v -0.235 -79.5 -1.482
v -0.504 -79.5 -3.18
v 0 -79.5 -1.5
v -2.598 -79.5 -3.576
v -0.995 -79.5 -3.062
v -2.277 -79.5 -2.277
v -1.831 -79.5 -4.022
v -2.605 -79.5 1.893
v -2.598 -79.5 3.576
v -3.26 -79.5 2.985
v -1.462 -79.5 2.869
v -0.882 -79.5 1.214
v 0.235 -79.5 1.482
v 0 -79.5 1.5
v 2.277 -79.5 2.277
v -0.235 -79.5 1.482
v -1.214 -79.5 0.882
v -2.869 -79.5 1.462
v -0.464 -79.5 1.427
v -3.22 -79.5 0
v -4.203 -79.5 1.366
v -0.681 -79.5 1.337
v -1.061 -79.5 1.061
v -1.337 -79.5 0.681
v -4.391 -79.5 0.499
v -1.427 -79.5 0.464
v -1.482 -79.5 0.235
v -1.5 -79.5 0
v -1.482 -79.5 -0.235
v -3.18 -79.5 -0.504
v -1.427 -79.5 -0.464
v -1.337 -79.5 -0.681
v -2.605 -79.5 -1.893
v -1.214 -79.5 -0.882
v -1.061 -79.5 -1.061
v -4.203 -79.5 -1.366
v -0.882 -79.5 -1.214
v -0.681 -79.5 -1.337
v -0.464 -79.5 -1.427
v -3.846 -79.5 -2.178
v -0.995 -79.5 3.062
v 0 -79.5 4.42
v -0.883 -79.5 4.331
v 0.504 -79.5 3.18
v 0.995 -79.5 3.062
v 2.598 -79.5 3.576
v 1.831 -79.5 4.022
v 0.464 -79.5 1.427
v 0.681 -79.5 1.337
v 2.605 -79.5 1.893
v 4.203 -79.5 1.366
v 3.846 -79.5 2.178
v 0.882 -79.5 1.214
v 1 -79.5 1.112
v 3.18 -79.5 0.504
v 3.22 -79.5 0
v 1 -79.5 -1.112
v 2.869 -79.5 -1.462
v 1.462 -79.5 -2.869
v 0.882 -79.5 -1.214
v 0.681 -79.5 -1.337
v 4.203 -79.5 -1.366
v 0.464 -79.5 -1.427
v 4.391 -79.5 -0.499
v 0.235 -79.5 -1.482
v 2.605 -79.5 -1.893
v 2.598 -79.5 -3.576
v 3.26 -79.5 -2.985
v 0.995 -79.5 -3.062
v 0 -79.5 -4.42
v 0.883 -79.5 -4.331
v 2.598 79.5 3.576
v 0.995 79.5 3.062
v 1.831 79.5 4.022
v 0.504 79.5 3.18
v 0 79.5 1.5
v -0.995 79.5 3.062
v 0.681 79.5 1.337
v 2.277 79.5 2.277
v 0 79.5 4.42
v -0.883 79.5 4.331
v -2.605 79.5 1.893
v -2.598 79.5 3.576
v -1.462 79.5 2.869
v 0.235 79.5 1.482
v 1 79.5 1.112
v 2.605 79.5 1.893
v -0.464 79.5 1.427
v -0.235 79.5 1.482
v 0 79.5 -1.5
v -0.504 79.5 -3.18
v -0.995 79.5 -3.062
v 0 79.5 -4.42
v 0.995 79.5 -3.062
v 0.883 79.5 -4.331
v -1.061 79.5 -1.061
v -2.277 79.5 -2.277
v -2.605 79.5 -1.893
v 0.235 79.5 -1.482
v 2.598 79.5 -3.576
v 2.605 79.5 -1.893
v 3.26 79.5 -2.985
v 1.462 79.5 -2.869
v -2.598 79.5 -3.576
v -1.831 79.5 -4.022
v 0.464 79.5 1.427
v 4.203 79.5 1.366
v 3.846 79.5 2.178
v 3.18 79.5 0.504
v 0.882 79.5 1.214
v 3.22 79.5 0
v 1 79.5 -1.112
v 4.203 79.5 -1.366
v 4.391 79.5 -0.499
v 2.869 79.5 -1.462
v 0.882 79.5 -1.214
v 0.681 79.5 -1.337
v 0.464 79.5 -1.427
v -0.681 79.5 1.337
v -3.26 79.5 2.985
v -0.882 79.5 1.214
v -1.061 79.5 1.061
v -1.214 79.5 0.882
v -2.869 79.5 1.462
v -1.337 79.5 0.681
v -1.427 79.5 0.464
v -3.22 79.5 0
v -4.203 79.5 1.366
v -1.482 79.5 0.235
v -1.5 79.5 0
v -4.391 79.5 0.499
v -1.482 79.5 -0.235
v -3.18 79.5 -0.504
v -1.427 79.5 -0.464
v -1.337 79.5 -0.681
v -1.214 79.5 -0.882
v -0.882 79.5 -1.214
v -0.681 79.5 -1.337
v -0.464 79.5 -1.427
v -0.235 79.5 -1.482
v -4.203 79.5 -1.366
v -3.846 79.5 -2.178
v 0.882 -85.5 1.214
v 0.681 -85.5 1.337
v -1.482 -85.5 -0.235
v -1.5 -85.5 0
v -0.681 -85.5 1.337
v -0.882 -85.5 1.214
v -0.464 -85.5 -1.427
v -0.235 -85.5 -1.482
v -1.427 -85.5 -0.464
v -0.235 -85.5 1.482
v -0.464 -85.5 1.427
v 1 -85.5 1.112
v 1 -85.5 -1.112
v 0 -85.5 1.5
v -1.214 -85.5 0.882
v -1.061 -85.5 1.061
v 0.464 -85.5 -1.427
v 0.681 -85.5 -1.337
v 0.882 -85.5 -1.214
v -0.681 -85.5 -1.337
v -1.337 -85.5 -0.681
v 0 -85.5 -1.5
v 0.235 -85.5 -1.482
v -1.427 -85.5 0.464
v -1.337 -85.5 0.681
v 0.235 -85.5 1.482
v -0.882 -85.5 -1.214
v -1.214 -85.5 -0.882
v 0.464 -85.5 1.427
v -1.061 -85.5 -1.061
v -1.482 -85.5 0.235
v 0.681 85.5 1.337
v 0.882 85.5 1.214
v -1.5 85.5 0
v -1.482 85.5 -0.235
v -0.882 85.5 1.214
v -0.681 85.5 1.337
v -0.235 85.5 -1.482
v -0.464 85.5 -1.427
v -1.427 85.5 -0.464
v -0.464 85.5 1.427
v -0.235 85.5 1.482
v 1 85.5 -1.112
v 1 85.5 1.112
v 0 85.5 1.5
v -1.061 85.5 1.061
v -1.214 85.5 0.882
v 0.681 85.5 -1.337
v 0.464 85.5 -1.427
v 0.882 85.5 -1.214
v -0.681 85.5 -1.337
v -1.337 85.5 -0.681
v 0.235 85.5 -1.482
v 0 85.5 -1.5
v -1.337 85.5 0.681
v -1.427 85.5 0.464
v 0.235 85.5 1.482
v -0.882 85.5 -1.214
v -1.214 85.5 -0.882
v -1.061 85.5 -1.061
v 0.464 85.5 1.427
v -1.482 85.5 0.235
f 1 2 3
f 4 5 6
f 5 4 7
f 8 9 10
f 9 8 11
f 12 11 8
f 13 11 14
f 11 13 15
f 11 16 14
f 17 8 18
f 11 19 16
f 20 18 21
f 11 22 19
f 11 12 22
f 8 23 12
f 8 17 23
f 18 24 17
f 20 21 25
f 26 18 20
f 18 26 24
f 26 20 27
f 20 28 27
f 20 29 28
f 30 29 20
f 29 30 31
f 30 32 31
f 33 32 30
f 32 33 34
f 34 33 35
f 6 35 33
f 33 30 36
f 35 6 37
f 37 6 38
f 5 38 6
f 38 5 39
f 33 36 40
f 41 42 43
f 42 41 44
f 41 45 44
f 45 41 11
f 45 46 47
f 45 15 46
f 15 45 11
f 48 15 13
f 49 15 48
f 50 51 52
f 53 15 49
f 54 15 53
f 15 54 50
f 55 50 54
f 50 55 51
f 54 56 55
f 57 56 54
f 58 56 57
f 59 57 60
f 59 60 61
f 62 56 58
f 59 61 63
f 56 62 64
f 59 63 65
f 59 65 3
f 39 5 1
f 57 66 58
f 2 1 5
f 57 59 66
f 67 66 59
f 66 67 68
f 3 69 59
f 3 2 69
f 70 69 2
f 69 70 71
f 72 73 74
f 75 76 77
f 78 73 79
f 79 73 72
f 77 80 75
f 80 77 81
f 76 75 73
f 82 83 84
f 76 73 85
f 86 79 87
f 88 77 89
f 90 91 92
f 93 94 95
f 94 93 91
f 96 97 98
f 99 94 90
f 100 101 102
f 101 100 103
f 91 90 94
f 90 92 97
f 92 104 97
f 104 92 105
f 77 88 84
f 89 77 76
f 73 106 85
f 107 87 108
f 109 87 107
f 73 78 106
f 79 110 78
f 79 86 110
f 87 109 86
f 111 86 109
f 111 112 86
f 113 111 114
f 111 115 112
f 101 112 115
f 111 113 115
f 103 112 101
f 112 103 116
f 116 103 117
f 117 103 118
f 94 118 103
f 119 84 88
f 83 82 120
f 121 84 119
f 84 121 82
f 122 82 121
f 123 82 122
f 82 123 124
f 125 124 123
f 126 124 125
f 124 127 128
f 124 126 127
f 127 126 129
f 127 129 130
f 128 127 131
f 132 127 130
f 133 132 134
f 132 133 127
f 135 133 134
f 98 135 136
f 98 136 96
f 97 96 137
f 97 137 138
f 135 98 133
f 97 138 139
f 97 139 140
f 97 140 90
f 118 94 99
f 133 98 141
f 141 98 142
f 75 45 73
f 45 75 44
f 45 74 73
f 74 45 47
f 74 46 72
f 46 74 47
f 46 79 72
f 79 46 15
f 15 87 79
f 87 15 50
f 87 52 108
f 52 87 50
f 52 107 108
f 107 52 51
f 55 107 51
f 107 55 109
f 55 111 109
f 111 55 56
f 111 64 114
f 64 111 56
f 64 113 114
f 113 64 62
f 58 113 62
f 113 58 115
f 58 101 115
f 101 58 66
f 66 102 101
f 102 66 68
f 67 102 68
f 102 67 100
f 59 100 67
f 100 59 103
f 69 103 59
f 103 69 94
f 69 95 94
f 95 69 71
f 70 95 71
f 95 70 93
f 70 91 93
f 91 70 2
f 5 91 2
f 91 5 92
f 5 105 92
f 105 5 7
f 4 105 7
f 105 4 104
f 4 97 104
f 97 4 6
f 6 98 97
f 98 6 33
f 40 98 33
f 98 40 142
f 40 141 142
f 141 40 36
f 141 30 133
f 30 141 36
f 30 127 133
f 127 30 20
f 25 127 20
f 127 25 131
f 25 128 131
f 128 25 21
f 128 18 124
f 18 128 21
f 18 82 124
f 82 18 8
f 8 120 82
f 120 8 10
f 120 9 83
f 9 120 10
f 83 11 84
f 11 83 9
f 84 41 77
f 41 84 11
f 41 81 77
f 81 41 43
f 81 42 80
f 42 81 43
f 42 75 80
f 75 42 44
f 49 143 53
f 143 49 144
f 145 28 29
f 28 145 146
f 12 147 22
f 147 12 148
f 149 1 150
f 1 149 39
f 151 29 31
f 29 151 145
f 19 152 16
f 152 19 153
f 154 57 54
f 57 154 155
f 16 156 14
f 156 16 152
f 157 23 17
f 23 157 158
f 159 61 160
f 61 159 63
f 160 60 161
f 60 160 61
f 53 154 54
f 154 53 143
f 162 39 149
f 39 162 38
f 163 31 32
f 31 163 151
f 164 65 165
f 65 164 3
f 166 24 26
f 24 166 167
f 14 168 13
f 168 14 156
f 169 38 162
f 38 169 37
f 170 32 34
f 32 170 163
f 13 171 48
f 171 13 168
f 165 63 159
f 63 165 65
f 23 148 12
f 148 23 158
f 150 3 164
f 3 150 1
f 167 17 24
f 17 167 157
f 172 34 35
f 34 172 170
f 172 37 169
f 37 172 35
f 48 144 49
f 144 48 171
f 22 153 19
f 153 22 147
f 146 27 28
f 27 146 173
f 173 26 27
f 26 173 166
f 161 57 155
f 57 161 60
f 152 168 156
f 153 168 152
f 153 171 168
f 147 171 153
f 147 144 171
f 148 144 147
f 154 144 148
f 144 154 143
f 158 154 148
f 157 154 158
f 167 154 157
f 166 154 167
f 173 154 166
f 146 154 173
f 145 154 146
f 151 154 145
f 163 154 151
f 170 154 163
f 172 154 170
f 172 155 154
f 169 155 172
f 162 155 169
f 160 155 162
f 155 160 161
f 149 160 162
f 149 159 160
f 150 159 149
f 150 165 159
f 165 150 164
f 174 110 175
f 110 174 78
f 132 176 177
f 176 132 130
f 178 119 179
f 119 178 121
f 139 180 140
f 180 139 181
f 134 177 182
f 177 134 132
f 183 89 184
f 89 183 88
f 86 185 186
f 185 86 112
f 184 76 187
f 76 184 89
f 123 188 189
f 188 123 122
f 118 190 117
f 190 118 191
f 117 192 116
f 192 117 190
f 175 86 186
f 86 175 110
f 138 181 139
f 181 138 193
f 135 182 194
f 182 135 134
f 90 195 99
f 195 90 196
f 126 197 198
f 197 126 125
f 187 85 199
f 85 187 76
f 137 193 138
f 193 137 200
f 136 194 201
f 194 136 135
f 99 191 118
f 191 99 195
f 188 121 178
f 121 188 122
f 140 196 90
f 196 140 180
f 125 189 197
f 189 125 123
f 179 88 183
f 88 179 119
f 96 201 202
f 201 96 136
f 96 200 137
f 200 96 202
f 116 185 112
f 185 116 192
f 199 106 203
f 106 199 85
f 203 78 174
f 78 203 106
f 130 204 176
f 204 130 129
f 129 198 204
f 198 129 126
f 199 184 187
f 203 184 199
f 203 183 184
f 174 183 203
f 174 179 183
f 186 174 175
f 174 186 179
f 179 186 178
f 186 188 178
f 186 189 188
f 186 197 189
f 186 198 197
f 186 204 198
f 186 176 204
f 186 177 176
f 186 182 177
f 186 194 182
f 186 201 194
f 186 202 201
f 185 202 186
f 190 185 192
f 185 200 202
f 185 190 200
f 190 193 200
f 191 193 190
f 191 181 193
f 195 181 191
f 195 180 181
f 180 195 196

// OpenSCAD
// file: parts/ch1_03c_long_gear_shaft_params.scad
// CH1 03C 长齿轮轴 — 参数真值源
// 单位：毫米。坐标约定：轴线沿世界 Y；齿轮截面位于 XZ 平面。

//#region 导入/依赖
// 无外部依赖；数值与现有 cabinet_clutch.scad 的 3 mm 节距齿轮保持一致。
//#endregion

//#region 常量/配置
LONG_GEAR_MODEL = is_undef(LONG_GEAR_MODEL) ? "solid" : LONG_GEAR_MODEL;
// x1c_fine = 0.4 mm 喷嘴下的细杆主方案；standard = 原 12T/3 mm 兼容回退。
LONG_GEAR_PRESET = is_undef(LONG_GEAR_PRESET) ? "x1c_fine" : LONG_GEAR_PRESET;

LONG_GEAR_TEETH = is_undef(LONG_GEAR_TEETH)
    ? (LONG_GEAR_PRESET == "x1c_fine" ? 10 : 12)
    : LONG_GEAR_TEETH;
LONG_GEAR_PITCH_MM = is_undef(LONG_GEAR_PITCH_MM)
    ? (LONG_GEAR_PRESET == "x1c_fine" ? 2.4 : 3.0)
    : LONG_GEAR_PITCH_MM;
LONG_GEAR_TOOTH_DEPTH = is_undef(LONG_GEAR_TOOTH_DEPTH)
    ? (LONG_GEAR_PRESET == "x1c_fine" ? 0.60 : 0.82)
    : LONG_GEAR_TOOTH_DEPTH;

// 细版略放宽齿根槽，使 0.4 mm 喷嘴仍有可辨识的开口；standard 保持
// 原仓库 0.20→0.80 的齿顶/齿根分配。
LONG_GEAR_TIP_START = is_undef(LONG_GEAR_TIP_START)
    ? (LONG_GEAR_PRESET == "x1c_fine" ? 0.18 : 0.20)
    : LONG_GEAR_TIP_START;
LONG_GEAR_TIP_END = is_undef(LONG_GEAR_TIP_END)
    ? 0.50
    : LONG_GEAR_TIP_END;
LONG_GEAR_ROOT_END = is_undef(LONG_GEAR_ROOT_END)
    ? (LONG_GEAR_PRESET == "x1c_fine" ? 0.75 : 0.80)
    : LONG_GEAR_ROOT_END;

// 当前 cabinet_clutch 的上下同步轮中心间距约 158.93 mm；取 159 mm，
// 让齿段覆盖几乎整个动力杆，同时保留两端装同步轮的 D 轴伸出段。
LONG_GEAR_LENGTH = is_undef(LONG_GEAR_LENGTH) ? 159.0 : LONG_GEAR_LENGTH;
LONG_GEAR_END_STUB_LENGTH = is_undef(LONG_GEAR_END_STUB_LENGTH)
    ? 6.0
    : LONG_GEAR_END_STUB_LENGTH;       // 齿段两端各外露 6 mm
LONG_GEAR_STUB_OVERLAP = is_undef(LONG_GEAR_STUB_OVERLAP)
    ? 0.20
    : LONG_GEAR_STUB_OVERLAP;           // 实心版端轴向齿段内搭接

LONG_GEAR_END_D = 3.0;                // 两端同步轮安装轴：名义 Ø3 mm
LONG_GEAR_END_FLAT_DEPTH = 0.50;      // D 平面从圆周切入 0.50 mm

// sleeve 版套在现有金属 Ø3 mm D 轴上；按仓库现有打印配合写法给径向余量。
LONG_GEAR_BORE_RADIAL_CLEARANCE = 0.12;
LONG_GEAR_BORE_FLAT_CLEARANCE = 0.12;

LONG_GEAR_EPS = 0.05;
//#endregion

//#region 模型/类型
// solid  = 实心齿轮轴 + 两端整体 D 轴；
// sleeve = 长齿轮本体带 D 孔，套在外部金属 D 轴上。
//#endregion

//#region 私有成员：齿形函数
function long_gear_pitch_r() =
    LONG_GEAR_TEETH * LONG_GEAR_PITCH_MM / (2 * PI);

function long_gear_root_r() =
    long_gear_pitch_r() - LONG_GEAR_TOOTH_DEPTH;

function long_gear_tip_r() =
    long_gear_pitch_r() + LONG_GEAR_TOOTH_DEPTH;

function long_gear_outer_d() =
    2 * long_gear_tip_r();

function long_gear_tip_land_mm() =
    (LONG_GEAR_TIP_END - LONG_GEAR_TIP_START)
        * LONG_GEAR_PITCH_MM
        * long_gear_tip_r() / long_gear_pitch_r();

function long_gear_root_gap_mm() =
    (1.0 - LONG_GEAR_ROOT_END)
        * LONG_GEAR_PITCH_MM
        * long_gear_root_r() / long_gear_pitch_r();

function long_gear_polar(r, a) = [r * cos(a), r * sin(a)];

// 每个齿沿 Y 方向是连续直齿；XZ 截面采用参数化的齿顶平台轮廓。
// standard 复用旧的 0.20→0.80 分配，x1c_fine 则把齿顶起点前移、齿根槽放宽。
function long_gear_points() = [
    for (i = [0:LONG_GEAR_TEETH - 1])
        for (p = [
            [0.00, long_gear_root_r()],
            [LONG_GEAR_TIP_START, long_gear_tip_r()],
            [LONG_GEAR_TIP_END, long_gear_tip_r()],
            [LONG_GEAR_ROOT_END, long_gear_root_r()]
        ])
            let (a = (i + p[0]) * 360 / LONG_GEAR_TEETH)
                long_gear_polar(p[1], a)
];
//#endregion

//#region 公开 API
// 根入口由 ch1_03c_long_gear_shaft.scad 消费；参数文件本身不输出几何。
//#endregion

//#region 业务逻辑
// 该组件的默认工作方向是：Y 轴为长度方向，XZ 平面为齿轮截面。
//#endregion

//#region 方法/工具
assert(LONG_GEAR_PRESET == "x1c_fine" || LONG_GEAR_PRESET == "standard",
    "unknown long gear preset");
assert(LONG_GEAR_TEETH >= 6, "long gear needs at least 6 teeth");
assert(LONG_GEAR_PITCH_MM > 0, "gear pitch must be positive");
assert(long_gear_root_r() > 0, "gear root radius must be positive");
assert(
    0 < LONG_GEAR_TIP_START
    && LONG_GEAR_TIP_START < LONG_GEAR_TIP_END
    && LONG_GEAR_TIP_END < LONG_GEAR_ROOT_END
    && LONG_GEAR_ROOT_END < 1,
    "invalid tooth profile fractions"
);
assert(LONG_GEAR_LENGTH > 0, "gear length must be positive");
assert(LONG_GEAR_END_STUB_LENGTH >= 0, "end stub length cannot be negative");
assert(LONG_GEAR_END_D > 0, "end shaft diameter must be positive");
//#endregion
// main file
// CH1 03C 长齿轮轴 — Y 向长齿 + 两端 Ø3 mm D 轴
//
// Mechanical contract
// process: FDM fit prototype; PETG/nylon preferred for the solid shaft, rigid resin only for fit checks
// material: to be confirmed; the printed Ø3 mm end stubs are not a steel-shaft substitute
// parting_plane: n/a (single axis-aligned printed part)
// opening_direction: n/a
// fastener: timing pulleys slide onto the two nominal Ø3 mm D end stubs in solid mode
// seal: n/a
// print_orientation: lay the part along Y only for assembly; for FDM, print standing or split only after slicer review
// units: mm
// axis: world Y; gear cross-section: world XZ
//
// PRESET values:
//   x1c_fine — 10T / 2.4 mm pitch / 0.60 mm tooth depth, selected for the stock 0.4 mm nozzle
//   standard — legacy 12T / 3.0 mm pitch / 0.82 mm tooth depth, for current 3 mm-pitch mating parts
//
// MODEL values:
//   solid  — full gear section plus an integral 6 mm D stub at each end
//   sleeve — same long gear section with a clearance D bore for an external metal D shaft

//#region 导入/依赖
include <parts/ch1_03c_long_gear_shaft_params.scad>
//#endregion

//#region 常量/配置
$fa = 6;
$fs = 0.24;
//#endregion

//#region 模型/类型
// The 2D profile is authored in local XY and rotated so local +Z becomes world +Y.
//#endregion

//#region 私有成员：截面与轴段
module long_gear_profile_2d() {
    polygon(long_gear_points());
}

module d_profile_2d(
    d,
    flat_depth,
    radial_clearance = 0,
    flat_clearance = 0
) {
    outer_d = d + 2 * radial_clearance;
    difference() {
        circle(d = outer_d);
        // The square removes the +X side, leaving the D flat in the XZ section.
        translate([
            d / 2 - flat_depth + flat_clearance,
            -(outer_d + 2 * LONG_GEAR_EPS)
        ])
            square([
                outer_d + 2 * LONG_GEAR_EPS,
                2 * (outer_d + 2 * LONG_GEAR_EPS)
            ]);
    }
}

module long_gear_body() {
    // Gear body is centered at Y=0 and spans -L/2..+L/2.
    translate([0, -LONG_GEAR_LENGTH / 2, 0])
        rotate([-90, 0, 0])
            linear_extrude(
                height = LONG_GEAR_LENGTH,
                convexity = max(8, LONG_GEAR_TEETH)
            )
                long_gear_profile_2d();
}

module d_axis_segment_y(y0, length) {
    // A local +Z extrusion becomes a world +Y D cylinder.
    translate([0, y0, 0])
        rotate([-90, 0, 0])
            linear_extrude(height = length, convexity = 4)
                d_profile_2d(
                    LONG_GEAR_END_D,
                    LONG_GEAR_END_FLAT_DEPTH
                );
}

module d_bore_cut() {
    // The sleeve bore is cut only through the gear body. The real metal shaft
    // is expected to continue beyond both gear faces for pulley mounting.
    translate([
        0,
        -LONG_GEAR_LENGTH / 2 - LONG_GEAR_EPS,
        0
    ])
        rotate([-90, 0, 0])
            linear_extrude(
                height = LONG_GEAR_LENGTH + 2 * LONG_GEAR_EPS,
                convexity = 4
            )
                d_profile_2d(
                    LONG_GEAR_END_D,
                    LONG_GEAR_END_FLAT_DEPTH,
                    LONG_GEAR_BORE_RADIAL_CLEARANCE,
                    LONG_GEAR_BORE_FLAT_CLEARANCE
                );
}
//#endregion

//#region 公开 API：两种打印件
module long_gear_shaft_solid() {
    // The overlap is hidden inside the gear body so each D stub is materially
    // connected rather than merely touching a coplanar end face.
    union() {
        long_gear_body();
        d_axis_segment_y(
            -LONG_GEAR_LENGTH / 2 - LONG_GEAR_END_STUB_LENGTH,
            LONG_GEAR_END_STUB_LENGTH + LONG_GEAR_STUB_OVERLAP
        );
        d_axis_segment_y(
            LONG_GEAR_LENGTH / 2 - LONG_GEAR_STUB_OVERLAP,
            LONG_GEAR_END_STUB_LENGTH + LONG_GEAR_STUB_OVERLAP
        );
    }
}

module long_gear_shaft_sleeve() {
    difference() {
        long_gear_body();
        d_bore_cut();
    }
}

module long_gear_shaft_comparison() {
    // Preview-only side-by-side check; never use this entry for a printable STL.
    translate([-11, 0, 0])
        long_gear_shaft_solid();
    translate([11, 0, 0])
        long_gear_shaft_sleeve();
}
//#endregion

//#region 业务逻辑
if (LONG_GEAR_MODEL == "solid") {
    long_gear_shaft_solid();
} else if (LONG_GEAR_MODEL == "sleeve") {
    long_gear_shaft_sleeve();
} else if (LONG_GEAR_MODEL == "comparison") {
    long_gear_shaft_comparison();
} else {
    assert(false, str("unknown LONG_GEAR_MODEL: ", LONG_GEAR_MODEL));
}

echo(
    "long_gear_shaft",
    "model",
    LONG_GEAR_MODEL,
    "preset",
    LONG_GEAR_PRESET,
    "axis",
    "Y",
    "profile_plane",
    "XZ",
    "teeth",
    LONG_GEAR_TEETH,
    "pitch_mm",
    LONG_GEAR_PITCH_MM,
    "gear_length_mm",
    LONG_GEAR_LENGTH,
    "end_stub_length_mm",
    LONG_GEAR_END_STUB_LENGTH,
    "overall_length_mm",
    LONG_GEAR_LENGTH + 2 * LONG_GEAR_END_STUB_LENGTH,
    "outer_d_mm",
    long_gear_outer_d(),
    "root_d_mm",
    2 * long_gear_root_r(),
    "tip_land_mm",
    long_gear_tip_land_mm(),
    "root_gap_mm",
    long_gear_root_gap_mm(),
    "end_d_mm",
    LONG_GEAR_END_D
);
//#endregion

//#region 方法/工具
// 导出示例：-D LONG_GEAR_MODEL="solid" 或 "sleeve"。
//#endregion
